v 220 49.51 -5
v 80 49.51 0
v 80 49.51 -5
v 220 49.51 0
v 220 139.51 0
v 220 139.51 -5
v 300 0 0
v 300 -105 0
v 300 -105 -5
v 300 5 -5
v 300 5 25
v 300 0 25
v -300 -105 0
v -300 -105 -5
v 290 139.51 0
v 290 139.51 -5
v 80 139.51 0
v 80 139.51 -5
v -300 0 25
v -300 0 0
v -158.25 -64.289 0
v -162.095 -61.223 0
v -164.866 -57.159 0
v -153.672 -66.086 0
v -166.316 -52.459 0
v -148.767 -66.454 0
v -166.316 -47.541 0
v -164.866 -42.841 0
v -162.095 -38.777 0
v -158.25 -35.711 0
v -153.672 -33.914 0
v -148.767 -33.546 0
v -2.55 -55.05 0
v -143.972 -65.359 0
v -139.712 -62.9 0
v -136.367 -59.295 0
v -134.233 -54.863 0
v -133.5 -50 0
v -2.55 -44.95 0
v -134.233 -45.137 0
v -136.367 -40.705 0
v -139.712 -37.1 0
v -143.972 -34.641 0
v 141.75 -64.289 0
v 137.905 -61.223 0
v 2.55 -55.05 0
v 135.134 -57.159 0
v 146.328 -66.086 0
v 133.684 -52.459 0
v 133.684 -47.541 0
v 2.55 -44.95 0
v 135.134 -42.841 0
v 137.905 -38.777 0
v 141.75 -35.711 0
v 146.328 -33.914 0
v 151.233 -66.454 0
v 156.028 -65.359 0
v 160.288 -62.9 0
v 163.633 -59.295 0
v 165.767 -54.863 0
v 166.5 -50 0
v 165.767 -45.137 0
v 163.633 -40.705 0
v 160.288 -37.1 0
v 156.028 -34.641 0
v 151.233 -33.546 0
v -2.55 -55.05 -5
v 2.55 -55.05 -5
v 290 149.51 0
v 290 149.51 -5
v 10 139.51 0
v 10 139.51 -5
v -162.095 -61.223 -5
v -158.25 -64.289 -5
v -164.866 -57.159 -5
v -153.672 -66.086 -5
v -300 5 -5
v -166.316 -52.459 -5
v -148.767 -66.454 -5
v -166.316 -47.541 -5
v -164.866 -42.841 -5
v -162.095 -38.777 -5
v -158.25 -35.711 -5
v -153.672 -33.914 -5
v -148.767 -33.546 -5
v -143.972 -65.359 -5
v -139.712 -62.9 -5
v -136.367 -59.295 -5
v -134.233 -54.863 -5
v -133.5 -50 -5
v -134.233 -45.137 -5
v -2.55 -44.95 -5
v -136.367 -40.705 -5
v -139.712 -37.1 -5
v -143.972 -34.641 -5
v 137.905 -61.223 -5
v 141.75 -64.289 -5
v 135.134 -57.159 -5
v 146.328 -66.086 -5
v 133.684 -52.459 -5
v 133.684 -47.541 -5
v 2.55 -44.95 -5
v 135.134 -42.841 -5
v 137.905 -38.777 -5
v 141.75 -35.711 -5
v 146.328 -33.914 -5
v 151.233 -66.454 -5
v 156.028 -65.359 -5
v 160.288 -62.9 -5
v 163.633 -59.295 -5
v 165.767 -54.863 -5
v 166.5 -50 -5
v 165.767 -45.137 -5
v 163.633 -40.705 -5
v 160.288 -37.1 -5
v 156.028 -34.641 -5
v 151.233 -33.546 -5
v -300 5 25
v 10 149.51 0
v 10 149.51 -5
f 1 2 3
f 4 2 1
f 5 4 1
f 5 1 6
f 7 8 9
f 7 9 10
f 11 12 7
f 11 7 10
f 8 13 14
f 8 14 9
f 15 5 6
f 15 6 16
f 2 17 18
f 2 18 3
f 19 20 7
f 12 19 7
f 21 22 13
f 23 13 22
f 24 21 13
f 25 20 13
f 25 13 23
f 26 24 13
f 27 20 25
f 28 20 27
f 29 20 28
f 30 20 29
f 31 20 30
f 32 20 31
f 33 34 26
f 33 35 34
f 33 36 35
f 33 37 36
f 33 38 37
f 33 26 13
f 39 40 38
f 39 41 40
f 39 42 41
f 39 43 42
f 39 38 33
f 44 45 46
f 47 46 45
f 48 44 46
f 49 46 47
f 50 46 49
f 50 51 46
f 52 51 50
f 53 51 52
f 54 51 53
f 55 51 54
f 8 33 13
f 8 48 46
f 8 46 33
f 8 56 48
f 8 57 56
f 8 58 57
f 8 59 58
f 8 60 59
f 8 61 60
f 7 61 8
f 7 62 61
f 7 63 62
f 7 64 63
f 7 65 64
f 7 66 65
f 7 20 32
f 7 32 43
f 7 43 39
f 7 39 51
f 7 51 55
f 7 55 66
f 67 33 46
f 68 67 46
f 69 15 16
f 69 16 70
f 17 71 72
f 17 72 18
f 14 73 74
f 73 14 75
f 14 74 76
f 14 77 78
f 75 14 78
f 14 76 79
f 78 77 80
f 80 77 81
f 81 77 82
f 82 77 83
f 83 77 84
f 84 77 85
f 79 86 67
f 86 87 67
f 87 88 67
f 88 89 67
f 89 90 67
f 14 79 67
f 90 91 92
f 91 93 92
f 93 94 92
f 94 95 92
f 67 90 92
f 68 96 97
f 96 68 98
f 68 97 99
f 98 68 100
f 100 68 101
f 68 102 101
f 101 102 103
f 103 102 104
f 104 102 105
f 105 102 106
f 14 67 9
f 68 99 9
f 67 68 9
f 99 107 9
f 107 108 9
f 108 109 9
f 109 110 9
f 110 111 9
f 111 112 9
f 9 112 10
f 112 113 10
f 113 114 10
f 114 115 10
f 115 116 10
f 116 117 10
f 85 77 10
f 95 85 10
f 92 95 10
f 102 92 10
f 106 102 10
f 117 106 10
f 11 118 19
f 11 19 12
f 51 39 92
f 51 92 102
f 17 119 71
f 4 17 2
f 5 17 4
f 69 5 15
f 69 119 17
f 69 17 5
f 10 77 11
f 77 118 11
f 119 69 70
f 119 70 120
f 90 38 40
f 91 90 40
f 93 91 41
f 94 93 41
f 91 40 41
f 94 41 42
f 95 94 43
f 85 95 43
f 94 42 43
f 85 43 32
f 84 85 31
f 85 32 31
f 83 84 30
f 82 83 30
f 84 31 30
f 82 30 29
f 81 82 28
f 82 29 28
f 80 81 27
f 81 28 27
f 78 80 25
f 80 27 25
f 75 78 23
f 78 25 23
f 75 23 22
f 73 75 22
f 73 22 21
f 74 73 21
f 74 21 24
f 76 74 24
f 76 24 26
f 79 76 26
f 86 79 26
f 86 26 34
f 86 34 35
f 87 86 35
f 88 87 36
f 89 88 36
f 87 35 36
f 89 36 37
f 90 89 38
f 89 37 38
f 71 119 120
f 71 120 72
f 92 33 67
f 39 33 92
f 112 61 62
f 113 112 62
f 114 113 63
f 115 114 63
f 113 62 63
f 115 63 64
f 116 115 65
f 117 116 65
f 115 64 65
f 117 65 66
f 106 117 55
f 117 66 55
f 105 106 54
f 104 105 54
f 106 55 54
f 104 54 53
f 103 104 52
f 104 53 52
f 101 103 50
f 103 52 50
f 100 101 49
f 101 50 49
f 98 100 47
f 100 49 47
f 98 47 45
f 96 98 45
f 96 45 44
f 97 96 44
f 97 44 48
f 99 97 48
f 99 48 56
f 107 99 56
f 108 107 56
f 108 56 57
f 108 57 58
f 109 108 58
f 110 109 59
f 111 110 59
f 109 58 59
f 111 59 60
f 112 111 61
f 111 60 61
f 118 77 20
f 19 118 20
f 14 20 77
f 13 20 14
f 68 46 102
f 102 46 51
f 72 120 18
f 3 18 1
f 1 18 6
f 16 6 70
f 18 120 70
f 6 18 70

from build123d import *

# Parameters (mm, degrees)
F0_W     = 600
F0_H     = 5
F1_DEPTH = 25
F0_H_2   = 105
F0_R     = 16.5
F0_W_2   = 5.1
F0_H_3   = 10.1
F2_DEPTH = 5


with BuildPart() as f1:
    # F0 (on Top) → F1 (new body)
    with BuildSketch(Plane.XY):
        with Locations((0, 2.5)):
            Rectangle(F0_W, F0_H)
    extrude(amount=F1_DEPTH)

    # F0 (on Top) → F2 (join)
    with BuildSketch(Plane.XY):
        with Locations((0, 2.5)):
            Rectangle(F0_W, F0_H)
        with Locations((0, -52.5)):
            Rectangle(F0_W, F0_H_2)
        with Locations((-150, -50)):
            Circle(F0_R, mode=Mode.SUBTRACT)
        with Locations((0, -50)):
            Rectangle(F0_W_2, F0_H_3, mode=Mode.SUBTRACT)
        with Locations((150, -50)):
            Circle(F0_R, mode=Mode.SUBTRACT)
        Polygon((290, 149.51032), (10, 149.51032), (10, 139.51032), (80, 139.51032), (80, 49.51032), (220, 49.51032), (220, 139.51032), (290, 139.51032), align=None)
    extrude(amount=-F2_DEPTH)


solid = f1.part
